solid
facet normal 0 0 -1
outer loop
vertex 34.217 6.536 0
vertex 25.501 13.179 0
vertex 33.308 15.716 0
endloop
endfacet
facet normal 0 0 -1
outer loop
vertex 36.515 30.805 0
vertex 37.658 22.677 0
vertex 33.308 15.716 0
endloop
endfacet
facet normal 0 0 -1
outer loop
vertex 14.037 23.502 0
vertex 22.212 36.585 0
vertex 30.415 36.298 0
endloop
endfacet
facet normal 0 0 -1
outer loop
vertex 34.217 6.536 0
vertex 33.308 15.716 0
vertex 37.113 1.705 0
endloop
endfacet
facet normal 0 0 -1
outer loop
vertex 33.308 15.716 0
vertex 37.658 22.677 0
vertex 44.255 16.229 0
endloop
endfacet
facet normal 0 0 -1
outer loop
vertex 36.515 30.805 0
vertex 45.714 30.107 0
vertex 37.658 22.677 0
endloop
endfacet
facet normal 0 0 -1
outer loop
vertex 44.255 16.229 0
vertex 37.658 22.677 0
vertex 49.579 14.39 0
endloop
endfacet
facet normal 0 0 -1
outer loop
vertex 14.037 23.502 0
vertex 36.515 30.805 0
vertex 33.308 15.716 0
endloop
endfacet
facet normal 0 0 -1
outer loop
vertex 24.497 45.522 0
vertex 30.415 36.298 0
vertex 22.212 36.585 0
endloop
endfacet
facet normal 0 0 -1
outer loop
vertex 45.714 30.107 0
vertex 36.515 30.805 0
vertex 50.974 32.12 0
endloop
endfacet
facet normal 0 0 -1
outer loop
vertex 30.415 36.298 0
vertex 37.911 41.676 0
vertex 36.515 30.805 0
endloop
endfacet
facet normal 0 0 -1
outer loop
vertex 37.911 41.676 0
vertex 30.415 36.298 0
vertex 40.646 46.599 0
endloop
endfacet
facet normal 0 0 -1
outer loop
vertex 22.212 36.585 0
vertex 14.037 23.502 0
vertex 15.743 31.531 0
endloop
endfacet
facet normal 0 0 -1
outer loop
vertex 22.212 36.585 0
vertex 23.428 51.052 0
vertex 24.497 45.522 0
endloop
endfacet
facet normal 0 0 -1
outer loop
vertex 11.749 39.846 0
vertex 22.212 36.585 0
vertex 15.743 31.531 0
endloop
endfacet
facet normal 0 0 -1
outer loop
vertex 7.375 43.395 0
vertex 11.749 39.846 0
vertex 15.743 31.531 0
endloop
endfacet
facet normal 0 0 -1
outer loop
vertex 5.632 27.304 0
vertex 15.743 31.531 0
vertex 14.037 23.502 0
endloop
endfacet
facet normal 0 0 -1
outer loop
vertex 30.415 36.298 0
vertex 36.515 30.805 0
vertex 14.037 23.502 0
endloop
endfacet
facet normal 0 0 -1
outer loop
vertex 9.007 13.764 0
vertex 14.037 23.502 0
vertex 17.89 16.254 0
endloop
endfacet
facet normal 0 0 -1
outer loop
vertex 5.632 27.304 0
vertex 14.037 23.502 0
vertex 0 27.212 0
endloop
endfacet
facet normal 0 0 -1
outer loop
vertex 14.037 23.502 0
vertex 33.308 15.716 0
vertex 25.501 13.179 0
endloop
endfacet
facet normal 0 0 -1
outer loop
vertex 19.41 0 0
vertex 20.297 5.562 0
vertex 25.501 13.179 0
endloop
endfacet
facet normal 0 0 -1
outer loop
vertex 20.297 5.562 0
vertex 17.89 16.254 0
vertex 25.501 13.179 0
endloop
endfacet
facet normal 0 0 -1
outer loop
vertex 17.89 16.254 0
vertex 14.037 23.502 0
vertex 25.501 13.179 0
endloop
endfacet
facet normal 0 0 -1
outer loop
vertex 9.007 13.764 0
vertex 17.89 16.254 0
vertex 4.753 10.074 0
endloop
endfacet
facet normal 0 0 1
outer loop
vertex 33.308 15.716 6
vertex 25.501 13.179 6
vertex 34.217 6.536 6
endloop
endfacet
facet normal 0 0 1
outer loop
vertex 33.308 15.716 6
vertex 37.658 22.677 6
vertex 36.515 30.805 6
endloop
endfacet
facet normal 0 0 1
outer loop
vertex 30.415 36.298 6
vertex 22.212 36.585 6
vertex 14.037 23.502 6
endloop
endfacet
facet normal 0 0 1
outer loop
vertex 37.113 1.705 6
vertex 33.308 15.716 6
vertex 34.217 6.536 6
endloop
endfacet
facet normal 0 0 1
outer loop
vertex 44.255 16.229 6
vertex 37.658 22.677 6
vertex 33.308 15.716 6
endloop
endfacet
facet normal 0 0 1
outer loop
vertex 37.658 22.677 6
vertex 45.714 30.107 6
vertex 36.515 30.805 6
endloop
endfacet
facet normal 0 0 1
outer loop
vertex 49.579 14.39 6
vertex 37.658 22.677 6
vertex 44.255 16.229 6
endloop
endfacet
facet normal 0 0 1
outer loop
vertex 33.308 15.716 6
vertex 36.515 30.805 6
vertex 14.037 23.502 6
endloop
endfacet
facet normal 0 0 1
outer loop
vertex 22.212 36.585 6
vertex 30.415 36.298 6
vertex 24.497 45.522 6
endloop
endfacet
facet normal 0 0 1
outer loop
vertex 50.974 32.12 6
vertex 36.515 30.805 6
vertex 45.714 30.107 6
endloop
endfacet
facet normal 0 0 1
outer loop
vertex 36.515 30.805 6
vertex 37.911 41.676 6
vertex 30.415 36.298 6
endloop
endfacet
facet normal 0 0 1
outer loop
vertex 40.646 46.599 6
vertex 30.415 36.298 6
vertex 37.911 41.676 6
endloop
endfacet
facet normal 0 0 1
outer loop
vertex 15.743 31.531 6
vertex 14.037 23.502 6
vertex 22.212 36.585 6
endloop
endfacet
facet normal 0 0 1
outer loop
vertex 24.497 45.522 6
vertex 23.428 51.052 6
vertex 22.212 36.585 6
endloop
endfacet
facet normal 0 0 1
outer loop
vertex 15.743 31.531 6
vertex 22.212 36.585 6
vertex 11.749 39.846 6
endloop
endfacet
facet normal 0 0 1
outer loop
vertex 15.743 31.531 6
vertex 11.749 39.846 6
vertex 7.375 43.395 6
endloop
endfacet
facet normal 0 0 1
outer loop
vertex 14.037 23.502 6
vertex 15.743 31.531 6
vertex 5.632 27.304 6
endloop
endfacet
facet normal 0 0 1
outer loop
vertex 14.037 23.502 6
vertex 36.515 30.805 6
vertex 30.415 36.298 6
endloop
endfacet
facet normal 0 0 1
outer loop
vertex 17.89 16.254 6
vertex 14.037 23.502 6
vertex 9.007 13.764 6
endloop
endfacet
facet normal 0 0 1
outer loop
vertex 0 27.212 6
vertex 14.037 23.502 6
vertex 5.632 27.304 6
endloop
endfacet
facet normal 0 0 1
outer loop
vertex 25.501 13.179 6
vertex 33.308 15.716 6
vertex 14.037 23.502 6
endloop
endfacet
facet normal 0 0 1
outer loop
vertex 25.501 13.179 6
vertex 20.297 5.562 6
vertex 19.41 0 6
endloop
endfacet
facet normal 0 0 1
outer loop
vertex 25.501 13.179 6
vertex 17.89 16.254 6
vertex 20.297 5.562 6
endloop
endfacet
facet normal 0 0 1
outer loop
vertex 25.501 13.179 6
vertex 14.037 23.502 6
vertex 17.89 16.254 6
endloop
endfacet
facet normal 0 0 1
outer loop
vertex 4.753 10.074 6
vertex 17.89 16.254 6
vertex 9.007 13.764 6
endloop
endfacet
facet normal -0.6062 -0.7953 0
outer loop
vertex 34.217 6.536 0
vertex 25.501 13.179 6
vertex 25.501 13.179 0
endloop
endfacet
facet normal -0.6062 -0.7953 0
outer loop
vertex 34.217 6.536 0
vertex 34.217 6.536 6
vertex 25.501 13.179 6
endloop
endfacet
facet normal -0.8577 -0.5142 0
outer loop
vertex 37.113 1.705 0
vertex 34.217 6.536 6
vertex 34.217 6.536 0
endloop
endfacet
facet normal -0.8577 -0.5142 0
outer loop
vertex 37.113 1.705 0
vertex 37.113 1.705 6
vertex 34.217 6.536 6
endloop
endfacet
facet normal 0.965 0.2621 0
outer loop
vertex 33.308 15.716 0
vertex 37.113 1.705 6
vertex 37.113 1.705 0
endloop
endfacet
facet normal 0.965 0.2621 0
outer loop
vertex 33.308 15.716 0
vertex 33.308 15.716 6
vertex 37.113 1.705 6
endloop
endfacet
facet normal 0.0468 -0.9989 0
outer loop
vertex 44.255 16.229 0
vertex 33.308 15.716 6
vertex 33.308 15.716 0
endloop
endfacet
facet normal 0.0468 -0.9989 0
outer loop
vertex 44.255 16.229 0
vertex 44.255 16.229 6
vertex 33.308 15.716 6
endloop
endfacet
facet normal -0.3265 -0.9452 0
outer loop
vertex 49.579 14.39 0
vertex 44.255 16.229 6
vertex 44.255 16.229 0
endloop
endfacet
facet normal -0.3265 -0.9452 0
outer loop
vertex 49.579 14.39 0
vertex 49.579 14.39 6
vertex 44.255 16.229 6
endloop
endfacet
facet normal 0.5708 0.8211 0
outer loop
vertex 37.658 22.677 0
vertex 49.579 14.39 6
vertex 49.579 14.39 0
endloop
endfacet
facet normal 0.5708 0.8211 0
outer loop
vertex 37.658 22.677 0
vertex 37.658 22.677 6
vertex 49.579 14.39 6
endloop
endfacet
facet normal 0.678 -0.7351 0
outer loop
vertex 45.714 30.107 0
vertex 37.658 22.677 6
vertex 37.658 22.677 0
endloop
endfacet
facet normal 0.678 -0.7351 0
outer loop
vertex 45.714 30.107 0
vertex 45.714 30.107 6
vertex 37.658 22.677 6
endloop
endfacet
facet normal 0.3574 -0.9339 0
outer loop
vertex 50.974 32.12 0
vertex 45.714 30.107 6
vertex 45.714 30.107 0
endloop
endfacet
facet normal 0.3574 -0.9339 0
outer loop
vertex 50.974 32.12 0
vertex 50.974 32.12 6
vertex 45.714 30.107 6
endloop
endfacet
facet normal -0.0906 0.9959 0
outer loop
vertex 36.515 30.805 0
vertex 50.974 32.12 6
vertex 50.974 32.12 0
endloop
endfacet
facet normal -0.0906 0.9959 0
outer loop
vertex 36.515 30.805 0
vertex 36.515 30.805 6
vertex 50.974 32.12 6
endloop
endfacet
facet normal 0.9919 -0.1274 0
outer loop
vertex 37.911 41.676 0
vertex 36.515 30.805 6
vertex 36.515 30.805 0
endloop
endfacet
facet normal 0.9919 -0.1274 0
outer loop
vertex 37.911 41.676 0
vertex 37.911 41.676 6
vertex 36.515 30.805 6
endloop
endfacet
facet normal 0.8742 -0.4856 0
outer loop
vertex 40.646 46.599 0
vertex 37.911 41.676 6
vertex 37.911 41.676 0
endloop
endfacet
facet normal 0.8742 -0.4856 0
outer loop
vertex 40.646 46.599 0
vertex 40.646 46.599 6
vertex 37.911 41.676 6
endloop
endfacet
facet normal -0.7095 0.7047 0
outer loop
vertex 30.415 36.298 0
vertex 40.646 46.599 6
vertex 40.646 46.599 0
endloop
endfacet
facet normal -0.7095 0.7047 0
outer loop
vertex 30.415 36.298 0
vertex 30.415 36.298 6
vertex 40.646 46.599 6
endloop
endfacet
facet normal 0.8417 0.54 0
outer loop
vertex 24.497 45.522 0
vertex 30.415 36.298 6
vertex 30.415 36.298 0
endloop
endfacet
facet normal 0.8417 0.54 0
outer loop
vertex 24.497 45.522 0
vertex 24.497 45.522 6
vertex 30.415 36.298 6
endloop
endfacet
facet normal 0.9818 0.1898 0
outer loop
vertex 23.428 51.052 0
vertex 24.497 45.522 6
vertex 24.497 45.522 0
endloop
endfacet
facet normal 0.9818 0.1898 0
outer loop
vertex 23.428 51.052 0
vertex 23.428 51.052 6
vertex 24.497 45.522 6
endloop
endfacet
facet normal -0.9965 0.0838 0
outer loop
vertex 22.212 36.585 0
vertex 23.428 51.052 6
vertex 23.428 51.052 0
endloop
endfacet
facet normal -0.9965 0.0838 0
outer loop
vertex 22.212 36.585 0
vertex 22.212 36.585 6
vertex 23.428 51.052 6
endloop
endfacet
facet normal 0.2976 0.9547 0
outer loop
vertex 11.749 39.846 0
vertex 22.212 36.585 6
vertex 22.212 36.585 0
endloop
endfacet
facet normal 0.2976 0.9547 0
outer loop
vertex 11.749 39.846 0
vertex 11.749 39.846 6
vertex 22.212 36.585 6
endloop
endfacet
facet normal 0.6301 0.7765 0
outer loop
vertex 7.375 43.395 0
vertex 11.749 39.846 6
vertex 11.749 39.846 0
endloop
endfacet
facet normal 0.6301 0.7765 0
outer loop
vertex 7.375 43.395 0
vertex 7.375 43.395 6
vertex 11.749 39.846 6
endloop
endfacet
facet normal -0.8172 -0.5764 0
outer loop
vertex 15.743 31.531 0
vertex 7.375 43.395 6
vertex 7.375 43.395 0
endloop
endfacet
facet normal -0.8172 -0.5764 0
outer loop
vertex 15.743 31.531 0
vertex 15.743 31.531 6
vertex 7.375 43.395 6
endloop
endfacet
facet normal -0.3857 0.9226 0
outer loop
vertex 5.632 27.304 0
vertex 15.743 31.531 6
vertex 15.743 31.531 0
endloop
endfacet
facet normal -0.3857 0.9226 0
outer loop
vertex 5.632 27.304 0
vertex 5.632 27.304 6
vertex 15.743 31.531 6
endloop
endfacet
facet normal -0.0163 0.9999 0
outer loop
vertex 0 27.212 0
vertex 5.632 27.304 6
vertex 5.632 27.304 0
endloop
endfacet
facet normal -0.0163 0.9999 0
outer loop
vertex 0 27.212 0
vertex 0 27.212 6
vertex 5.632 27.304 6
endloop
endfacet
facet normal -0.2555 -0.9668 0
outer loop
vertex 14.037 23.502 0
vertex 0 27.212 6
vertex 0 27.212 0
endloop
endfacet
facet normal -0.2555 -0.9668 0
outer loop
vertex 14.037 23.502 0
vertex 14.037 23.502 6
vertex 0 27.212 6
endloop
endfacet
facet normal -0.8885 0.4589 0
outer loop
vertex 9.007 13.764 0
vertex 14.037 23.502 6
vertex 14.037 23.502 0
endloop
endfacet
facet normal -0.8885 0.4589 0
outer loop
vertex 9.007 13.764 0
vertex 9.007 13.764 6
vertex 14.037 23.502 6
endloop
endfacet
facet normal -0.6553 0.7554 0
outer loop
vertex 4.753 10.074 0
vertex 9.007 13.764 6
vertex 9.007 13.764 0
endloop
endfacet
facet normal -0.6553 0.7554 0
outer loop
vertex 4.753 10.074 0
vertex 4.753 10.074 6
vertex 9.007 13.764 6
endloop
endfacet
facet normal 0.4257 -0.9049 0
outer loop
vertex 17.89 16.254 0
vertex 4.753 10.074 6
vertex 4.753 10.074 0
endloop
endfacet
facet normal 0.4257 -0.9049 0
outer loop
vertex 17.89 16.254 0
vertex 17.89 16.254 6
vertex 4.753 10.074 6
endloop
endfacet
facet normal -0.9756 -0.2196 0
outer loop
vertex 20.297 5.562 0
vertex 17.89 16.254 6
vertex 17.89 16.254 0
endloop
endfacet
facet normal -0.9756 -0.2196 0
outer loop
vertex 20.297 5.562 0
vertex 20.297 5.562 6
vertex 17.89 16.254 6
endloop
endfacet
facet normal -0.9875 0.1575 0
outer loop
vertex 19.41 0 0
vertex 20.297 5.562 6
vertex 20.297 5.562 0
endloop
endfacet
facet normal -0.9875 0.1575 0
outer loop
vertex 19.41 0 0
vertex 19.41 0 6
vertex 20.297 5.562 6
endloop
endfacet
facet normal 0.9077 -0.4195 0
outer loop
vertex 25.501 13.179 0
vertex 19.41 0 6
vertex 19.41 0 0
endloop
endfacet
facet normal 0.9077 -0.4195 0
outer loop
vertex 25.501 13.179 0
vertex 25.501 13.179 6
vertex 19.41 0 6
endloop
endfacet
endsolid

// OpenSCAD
$fn = 32;

// ----------------------------------------------------------------------
// Fan rotor section: 9 blades, 12 mm hub radius, 14 mm blades
// ----------------------------------------------------------------------

// --- parameters (mm) ---
profile_height = 6;       // extrusion height
profile_points = 27;      // points of the closed outline

profile = [[37.658, 22.677], [45.714, 30.107], [50.974, 32.12], [36.515, 30.805], [37.911, 41.676], [40.646, 46.599], [30.415, 36.298], [24.497, 45.522], [23.428, 51.052], [22.212, 36.585], [11.749, 39.846], [7.375, 43.395], [15.743, 31.531], [5.632, 27.304], [0, 27.212], [14.037, 23.502], [9.007, 13.764], [4.753, 10.074], [17.89, 16.254], [20.297, 5.562], [19.41, 0], [25.501, 13.179], [34.217, 6.536], [37.113, 1.705], [33.308, 15.716], [44.255, 16.229], [49.579, 14.39]];  // single closed polygon, 27 points, counter clockwise

// --- the one profile operation ---
linear_extrude(height = profile_height) polygon(points = profile);
